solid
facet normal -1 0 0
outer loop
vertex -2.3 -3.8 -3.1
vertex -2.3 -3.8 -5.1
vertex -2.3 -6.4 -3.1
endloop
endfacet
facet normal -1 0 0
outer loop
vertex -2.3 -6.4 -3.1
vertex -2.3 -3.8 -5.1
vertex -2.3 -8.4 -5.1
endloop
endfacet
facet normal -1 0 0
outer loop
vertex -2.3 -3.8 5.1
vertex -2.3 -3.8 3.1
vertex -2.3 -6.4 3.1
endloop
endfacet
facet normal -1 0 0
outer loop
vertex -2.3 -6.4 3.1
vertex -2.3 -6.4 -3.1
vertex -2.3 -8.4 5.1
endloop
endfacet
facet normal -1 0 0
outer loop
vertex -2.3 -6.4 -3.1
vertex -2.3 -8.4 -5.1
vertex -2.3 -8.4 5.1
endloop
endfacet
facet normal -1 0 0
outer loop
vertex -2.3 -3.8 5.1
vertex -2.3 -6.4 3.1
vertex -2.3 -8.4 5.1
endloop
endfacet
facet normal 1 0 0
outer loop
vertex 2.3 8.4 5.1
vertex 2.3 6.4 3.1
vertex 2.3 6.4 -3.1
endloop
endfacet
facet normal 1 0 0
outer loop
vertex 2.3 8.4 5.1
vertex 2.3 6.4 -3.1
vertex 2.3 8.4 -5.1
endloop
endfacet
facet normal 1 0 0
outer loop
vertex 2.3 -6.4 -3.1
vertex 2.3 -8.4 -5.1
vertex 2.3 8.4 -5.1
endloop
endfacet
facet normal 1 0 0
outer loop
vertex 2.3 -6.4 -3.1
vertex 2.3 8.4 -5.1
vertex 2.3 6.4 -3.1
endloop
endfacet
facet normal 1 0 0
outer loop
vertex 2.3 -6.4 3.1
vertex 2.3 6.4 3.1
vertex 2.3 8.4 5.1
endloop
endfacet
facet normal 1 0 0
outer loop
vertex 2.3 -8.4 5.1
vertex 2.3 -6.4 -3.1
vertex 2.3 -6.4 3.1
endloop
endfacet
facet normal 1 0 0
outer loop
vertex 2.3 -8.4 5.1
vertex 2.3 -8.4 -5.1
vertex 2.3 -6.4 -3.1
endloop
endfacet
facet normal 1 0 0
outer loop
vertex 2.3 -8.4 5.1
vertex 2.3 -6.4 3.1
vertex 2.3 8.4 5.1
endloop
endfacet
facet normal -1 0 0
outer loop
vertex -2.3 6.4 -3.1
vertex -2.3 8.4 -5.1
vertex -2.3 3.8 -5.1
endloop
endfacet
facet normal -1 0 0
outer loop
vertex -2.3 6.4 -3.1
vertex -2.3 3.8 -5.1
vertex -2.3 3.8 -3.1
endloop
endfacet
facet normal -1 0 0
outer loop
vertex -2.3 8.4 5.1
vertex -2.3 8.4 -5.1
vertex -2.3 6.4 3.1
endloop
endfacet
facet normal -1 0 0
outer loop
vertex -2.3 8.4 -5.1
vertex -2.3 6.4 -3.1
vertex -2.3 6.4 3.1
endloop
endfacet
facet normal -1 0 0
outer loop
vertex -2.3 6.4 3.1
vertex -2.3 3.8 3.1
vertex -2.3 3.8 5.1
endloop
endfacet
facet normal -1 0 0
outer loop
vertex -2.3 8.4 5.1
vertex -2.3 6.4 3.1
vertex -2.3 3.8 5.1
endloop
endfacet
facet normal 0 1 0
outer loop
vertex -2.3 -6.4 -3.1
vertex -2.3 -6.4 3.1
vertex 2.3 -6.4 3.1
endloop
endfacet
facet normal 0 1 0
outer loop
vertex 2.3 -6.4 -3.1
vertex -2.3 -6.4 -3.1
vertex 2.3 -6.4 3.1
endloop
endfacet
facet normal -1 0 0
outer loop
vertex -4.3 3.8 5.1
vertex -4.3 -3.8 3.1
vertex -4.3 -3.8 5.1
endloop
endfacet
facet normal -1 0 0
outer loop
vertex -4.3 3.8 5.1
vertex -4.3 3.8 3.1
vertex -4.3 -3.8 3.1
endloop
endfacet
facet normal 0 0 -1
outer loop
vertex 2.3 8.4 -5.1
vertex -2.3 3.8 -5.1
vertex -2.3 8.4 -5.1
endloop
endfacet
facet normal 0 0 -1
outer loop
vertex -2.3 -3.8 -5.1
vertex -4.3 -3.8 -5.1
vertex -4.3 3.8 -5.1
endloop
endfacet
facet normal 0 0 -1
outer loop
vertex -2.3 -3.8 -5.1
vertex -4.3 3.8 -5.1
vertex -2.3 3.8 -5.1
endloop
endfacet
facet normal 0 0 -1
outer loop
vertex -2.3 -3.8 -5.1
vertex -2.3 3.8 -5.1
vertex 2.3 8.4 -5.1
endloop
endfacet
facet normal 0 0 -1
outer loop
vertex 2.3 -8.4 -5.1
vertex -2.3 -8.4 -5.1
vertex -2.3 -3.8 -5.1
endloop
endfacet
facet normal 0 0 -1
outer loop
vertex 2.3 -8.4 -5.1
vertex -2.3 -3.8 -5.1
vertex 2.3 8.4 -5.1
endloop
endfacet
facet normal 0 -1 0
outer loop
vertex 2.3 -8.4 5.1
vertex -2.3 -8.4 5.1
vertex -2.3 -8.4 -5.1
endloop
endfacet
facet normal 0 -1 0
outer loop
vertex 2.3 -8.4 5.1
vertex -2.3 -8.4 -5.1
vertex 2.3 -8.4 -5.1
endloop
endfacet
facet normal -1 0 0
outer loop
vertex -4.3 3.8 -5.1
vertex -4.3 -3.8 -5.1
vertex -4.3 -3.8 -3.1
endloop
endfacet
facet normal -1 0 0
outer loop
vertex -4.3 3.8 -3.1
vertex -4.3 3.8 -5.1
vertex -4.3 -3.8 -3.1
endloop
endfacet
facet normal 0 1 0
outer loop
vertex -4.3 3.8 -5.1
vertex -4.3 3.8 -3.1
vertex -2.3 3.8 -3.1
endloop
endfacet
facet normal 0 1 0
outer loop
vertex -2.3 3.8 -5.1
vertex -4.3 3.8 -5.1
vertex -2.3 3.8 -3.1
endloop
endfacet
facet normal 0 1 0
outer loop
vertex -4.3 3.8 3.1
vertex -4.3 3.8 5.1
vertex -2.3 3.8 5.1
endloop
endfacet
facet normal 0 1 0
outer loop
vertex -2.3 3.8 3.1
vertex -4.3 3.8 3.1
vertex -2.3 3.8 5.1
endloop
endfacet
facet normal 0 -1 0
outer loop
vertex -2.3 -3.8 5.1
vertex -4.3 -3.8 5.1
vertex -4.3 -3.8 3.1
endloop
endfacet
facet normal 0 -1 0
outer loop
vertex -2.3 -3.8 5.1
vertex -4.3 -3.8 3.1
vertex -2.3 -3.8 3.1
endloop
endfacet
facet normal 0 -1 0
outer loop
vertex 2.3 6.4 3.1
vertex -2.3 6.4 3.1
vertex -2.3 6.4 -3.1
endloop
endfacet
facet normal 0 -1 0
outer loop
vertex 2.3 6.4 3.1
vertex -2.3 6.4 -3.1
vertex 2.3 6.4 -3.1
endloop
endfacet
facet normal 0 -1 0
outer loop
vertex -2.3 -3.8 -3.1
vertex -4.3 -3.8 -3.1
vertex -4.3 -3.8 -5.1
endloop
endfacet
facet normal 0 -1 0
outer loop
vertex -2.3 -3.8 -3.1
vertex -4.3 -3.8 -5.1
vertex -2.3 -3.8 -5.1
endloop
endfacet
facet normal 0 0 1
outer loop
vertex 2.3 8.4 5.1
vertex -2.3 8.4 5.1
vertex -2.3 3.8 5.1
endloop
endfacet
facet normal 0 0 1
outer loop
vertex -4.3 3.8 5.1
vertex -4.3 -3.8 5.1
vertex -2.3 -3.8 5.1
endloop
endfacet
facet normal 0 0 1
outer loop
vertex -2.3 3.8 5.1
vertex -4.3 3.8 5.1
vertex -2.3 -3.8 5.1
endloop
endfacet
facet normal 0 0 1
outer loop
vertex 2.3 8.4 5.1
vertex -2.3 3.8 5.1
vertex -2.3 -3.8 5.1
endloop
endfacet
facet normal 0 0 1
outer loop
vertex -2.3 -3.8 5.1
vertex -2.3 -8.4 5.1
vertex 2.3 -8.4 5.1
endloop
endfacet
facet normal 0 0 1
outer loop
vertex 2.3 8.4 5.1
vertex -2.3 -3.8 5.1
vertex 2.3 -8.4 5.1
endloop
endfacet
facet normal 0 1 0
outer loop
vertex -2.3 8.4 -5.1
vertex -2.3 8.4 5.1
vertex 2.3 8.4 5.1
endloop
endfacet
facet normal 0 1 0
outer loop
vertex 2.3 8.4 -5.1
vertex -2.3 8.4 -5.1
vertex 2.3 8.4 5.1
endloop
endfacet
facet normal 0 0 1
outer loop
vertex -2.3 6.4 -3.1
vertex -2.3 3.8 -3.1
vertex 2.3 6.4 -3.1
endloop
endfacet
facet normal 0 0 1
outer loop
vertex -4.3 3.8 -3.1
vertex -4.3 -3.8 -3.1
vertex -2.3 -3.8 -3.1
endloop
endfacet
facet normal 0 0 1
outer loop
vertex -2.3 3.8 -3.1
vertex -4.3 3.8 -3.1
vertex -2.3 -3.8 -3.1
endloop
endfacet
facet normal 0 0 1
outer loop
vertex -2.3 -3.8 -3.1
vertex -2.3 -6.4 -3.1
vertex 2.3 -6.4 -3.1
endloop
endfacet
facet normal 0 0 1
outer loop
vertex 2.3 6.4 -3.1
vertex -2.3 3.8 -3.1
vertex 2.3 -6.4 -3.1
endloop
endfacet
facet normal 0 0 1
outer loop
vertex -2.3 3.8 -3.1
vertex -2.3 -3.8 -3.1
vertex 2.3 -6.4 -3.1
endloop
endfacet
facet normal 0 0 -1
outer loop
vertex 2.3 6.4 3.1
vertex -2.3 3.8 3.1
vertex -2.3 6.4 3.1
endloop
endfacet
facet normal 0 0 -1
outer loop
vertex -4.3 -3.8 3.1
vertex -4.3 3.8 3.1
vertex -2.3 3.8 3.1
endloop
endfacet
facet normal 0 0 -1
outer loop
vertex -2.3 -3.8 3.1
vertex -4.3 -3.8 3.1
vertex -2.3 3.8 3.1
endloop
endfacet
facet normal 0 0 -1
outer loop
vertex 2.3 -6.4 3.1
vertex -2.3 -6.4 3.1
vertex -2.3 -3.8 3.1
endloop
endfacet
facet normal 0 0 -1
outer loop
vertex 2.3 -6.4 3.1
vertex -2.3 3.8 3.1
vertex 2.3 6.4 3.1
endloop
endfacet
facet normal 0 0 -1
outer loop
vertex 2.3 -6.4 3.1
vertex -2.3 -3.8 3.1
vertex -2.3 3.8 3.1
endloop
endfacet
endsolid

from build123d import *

# Parameters (mm, degrees)
SKETCH063_W      = 2
SKETCH063_H      = 2
EXTRUDE068_DEPTH = 3.8
SKETCH062_W      = 4.6
SKETCH062_H      = 6.2
EXTRUDE067_DEPTH = 6.4
SKETCH061_W      = 4.6
SKETCH061_H      = 10.2
EXTRUDE066_DEPTH = 8.4


with BuildPart() as extrude_blocchi_tra_switch:
    # Sketch063 → Extrude068 (new body, symmetric)
    with BuildSketch(Plane.XZ):
        with Locations((-3.3, 4.1)):
            Rectangle(SKETCH063_W, SKETCH063_H)
        with Locations((-3.3, -4.1)):
            Rectangle(SKETCH063_W, SKETCH063_H)
    extrude(amount=EXTRUDE068_DEPTH, both=True)


with BuildPart() as extrude_struttura_interna_blocco_switch:
    # Sketch062 → Extrude067 (new body, symmetric)
    with BuildSketch(Plane.XZ):
        Rectangle(SKETCH062_W, SKETCH062_H)
    extrude(amount=EXTRUDE067_DEPTH, both=True)


with BuildPart() as fusion_blocco_switch:
    # Sketch061 → Extrude066 (new body, symmetric)
    with BuildSketch(Plane.XZ):
        Rectangle(SKETCH061_W, SKETCH061_H)
    extrude(amount=EXTRUDE066_DEPTH, both=True)

    # Cut036: cut Extrude struttura interna blocco switch
    add(extrude_struttura_interna_blocco_switch.part, mode=Mode.SUBTRACT)

    # Fusion002: union Extrude blocchi tra switch
    add(extrude_blocchi_tra_switch.part)


solid = fusion_blocco_switch.part
